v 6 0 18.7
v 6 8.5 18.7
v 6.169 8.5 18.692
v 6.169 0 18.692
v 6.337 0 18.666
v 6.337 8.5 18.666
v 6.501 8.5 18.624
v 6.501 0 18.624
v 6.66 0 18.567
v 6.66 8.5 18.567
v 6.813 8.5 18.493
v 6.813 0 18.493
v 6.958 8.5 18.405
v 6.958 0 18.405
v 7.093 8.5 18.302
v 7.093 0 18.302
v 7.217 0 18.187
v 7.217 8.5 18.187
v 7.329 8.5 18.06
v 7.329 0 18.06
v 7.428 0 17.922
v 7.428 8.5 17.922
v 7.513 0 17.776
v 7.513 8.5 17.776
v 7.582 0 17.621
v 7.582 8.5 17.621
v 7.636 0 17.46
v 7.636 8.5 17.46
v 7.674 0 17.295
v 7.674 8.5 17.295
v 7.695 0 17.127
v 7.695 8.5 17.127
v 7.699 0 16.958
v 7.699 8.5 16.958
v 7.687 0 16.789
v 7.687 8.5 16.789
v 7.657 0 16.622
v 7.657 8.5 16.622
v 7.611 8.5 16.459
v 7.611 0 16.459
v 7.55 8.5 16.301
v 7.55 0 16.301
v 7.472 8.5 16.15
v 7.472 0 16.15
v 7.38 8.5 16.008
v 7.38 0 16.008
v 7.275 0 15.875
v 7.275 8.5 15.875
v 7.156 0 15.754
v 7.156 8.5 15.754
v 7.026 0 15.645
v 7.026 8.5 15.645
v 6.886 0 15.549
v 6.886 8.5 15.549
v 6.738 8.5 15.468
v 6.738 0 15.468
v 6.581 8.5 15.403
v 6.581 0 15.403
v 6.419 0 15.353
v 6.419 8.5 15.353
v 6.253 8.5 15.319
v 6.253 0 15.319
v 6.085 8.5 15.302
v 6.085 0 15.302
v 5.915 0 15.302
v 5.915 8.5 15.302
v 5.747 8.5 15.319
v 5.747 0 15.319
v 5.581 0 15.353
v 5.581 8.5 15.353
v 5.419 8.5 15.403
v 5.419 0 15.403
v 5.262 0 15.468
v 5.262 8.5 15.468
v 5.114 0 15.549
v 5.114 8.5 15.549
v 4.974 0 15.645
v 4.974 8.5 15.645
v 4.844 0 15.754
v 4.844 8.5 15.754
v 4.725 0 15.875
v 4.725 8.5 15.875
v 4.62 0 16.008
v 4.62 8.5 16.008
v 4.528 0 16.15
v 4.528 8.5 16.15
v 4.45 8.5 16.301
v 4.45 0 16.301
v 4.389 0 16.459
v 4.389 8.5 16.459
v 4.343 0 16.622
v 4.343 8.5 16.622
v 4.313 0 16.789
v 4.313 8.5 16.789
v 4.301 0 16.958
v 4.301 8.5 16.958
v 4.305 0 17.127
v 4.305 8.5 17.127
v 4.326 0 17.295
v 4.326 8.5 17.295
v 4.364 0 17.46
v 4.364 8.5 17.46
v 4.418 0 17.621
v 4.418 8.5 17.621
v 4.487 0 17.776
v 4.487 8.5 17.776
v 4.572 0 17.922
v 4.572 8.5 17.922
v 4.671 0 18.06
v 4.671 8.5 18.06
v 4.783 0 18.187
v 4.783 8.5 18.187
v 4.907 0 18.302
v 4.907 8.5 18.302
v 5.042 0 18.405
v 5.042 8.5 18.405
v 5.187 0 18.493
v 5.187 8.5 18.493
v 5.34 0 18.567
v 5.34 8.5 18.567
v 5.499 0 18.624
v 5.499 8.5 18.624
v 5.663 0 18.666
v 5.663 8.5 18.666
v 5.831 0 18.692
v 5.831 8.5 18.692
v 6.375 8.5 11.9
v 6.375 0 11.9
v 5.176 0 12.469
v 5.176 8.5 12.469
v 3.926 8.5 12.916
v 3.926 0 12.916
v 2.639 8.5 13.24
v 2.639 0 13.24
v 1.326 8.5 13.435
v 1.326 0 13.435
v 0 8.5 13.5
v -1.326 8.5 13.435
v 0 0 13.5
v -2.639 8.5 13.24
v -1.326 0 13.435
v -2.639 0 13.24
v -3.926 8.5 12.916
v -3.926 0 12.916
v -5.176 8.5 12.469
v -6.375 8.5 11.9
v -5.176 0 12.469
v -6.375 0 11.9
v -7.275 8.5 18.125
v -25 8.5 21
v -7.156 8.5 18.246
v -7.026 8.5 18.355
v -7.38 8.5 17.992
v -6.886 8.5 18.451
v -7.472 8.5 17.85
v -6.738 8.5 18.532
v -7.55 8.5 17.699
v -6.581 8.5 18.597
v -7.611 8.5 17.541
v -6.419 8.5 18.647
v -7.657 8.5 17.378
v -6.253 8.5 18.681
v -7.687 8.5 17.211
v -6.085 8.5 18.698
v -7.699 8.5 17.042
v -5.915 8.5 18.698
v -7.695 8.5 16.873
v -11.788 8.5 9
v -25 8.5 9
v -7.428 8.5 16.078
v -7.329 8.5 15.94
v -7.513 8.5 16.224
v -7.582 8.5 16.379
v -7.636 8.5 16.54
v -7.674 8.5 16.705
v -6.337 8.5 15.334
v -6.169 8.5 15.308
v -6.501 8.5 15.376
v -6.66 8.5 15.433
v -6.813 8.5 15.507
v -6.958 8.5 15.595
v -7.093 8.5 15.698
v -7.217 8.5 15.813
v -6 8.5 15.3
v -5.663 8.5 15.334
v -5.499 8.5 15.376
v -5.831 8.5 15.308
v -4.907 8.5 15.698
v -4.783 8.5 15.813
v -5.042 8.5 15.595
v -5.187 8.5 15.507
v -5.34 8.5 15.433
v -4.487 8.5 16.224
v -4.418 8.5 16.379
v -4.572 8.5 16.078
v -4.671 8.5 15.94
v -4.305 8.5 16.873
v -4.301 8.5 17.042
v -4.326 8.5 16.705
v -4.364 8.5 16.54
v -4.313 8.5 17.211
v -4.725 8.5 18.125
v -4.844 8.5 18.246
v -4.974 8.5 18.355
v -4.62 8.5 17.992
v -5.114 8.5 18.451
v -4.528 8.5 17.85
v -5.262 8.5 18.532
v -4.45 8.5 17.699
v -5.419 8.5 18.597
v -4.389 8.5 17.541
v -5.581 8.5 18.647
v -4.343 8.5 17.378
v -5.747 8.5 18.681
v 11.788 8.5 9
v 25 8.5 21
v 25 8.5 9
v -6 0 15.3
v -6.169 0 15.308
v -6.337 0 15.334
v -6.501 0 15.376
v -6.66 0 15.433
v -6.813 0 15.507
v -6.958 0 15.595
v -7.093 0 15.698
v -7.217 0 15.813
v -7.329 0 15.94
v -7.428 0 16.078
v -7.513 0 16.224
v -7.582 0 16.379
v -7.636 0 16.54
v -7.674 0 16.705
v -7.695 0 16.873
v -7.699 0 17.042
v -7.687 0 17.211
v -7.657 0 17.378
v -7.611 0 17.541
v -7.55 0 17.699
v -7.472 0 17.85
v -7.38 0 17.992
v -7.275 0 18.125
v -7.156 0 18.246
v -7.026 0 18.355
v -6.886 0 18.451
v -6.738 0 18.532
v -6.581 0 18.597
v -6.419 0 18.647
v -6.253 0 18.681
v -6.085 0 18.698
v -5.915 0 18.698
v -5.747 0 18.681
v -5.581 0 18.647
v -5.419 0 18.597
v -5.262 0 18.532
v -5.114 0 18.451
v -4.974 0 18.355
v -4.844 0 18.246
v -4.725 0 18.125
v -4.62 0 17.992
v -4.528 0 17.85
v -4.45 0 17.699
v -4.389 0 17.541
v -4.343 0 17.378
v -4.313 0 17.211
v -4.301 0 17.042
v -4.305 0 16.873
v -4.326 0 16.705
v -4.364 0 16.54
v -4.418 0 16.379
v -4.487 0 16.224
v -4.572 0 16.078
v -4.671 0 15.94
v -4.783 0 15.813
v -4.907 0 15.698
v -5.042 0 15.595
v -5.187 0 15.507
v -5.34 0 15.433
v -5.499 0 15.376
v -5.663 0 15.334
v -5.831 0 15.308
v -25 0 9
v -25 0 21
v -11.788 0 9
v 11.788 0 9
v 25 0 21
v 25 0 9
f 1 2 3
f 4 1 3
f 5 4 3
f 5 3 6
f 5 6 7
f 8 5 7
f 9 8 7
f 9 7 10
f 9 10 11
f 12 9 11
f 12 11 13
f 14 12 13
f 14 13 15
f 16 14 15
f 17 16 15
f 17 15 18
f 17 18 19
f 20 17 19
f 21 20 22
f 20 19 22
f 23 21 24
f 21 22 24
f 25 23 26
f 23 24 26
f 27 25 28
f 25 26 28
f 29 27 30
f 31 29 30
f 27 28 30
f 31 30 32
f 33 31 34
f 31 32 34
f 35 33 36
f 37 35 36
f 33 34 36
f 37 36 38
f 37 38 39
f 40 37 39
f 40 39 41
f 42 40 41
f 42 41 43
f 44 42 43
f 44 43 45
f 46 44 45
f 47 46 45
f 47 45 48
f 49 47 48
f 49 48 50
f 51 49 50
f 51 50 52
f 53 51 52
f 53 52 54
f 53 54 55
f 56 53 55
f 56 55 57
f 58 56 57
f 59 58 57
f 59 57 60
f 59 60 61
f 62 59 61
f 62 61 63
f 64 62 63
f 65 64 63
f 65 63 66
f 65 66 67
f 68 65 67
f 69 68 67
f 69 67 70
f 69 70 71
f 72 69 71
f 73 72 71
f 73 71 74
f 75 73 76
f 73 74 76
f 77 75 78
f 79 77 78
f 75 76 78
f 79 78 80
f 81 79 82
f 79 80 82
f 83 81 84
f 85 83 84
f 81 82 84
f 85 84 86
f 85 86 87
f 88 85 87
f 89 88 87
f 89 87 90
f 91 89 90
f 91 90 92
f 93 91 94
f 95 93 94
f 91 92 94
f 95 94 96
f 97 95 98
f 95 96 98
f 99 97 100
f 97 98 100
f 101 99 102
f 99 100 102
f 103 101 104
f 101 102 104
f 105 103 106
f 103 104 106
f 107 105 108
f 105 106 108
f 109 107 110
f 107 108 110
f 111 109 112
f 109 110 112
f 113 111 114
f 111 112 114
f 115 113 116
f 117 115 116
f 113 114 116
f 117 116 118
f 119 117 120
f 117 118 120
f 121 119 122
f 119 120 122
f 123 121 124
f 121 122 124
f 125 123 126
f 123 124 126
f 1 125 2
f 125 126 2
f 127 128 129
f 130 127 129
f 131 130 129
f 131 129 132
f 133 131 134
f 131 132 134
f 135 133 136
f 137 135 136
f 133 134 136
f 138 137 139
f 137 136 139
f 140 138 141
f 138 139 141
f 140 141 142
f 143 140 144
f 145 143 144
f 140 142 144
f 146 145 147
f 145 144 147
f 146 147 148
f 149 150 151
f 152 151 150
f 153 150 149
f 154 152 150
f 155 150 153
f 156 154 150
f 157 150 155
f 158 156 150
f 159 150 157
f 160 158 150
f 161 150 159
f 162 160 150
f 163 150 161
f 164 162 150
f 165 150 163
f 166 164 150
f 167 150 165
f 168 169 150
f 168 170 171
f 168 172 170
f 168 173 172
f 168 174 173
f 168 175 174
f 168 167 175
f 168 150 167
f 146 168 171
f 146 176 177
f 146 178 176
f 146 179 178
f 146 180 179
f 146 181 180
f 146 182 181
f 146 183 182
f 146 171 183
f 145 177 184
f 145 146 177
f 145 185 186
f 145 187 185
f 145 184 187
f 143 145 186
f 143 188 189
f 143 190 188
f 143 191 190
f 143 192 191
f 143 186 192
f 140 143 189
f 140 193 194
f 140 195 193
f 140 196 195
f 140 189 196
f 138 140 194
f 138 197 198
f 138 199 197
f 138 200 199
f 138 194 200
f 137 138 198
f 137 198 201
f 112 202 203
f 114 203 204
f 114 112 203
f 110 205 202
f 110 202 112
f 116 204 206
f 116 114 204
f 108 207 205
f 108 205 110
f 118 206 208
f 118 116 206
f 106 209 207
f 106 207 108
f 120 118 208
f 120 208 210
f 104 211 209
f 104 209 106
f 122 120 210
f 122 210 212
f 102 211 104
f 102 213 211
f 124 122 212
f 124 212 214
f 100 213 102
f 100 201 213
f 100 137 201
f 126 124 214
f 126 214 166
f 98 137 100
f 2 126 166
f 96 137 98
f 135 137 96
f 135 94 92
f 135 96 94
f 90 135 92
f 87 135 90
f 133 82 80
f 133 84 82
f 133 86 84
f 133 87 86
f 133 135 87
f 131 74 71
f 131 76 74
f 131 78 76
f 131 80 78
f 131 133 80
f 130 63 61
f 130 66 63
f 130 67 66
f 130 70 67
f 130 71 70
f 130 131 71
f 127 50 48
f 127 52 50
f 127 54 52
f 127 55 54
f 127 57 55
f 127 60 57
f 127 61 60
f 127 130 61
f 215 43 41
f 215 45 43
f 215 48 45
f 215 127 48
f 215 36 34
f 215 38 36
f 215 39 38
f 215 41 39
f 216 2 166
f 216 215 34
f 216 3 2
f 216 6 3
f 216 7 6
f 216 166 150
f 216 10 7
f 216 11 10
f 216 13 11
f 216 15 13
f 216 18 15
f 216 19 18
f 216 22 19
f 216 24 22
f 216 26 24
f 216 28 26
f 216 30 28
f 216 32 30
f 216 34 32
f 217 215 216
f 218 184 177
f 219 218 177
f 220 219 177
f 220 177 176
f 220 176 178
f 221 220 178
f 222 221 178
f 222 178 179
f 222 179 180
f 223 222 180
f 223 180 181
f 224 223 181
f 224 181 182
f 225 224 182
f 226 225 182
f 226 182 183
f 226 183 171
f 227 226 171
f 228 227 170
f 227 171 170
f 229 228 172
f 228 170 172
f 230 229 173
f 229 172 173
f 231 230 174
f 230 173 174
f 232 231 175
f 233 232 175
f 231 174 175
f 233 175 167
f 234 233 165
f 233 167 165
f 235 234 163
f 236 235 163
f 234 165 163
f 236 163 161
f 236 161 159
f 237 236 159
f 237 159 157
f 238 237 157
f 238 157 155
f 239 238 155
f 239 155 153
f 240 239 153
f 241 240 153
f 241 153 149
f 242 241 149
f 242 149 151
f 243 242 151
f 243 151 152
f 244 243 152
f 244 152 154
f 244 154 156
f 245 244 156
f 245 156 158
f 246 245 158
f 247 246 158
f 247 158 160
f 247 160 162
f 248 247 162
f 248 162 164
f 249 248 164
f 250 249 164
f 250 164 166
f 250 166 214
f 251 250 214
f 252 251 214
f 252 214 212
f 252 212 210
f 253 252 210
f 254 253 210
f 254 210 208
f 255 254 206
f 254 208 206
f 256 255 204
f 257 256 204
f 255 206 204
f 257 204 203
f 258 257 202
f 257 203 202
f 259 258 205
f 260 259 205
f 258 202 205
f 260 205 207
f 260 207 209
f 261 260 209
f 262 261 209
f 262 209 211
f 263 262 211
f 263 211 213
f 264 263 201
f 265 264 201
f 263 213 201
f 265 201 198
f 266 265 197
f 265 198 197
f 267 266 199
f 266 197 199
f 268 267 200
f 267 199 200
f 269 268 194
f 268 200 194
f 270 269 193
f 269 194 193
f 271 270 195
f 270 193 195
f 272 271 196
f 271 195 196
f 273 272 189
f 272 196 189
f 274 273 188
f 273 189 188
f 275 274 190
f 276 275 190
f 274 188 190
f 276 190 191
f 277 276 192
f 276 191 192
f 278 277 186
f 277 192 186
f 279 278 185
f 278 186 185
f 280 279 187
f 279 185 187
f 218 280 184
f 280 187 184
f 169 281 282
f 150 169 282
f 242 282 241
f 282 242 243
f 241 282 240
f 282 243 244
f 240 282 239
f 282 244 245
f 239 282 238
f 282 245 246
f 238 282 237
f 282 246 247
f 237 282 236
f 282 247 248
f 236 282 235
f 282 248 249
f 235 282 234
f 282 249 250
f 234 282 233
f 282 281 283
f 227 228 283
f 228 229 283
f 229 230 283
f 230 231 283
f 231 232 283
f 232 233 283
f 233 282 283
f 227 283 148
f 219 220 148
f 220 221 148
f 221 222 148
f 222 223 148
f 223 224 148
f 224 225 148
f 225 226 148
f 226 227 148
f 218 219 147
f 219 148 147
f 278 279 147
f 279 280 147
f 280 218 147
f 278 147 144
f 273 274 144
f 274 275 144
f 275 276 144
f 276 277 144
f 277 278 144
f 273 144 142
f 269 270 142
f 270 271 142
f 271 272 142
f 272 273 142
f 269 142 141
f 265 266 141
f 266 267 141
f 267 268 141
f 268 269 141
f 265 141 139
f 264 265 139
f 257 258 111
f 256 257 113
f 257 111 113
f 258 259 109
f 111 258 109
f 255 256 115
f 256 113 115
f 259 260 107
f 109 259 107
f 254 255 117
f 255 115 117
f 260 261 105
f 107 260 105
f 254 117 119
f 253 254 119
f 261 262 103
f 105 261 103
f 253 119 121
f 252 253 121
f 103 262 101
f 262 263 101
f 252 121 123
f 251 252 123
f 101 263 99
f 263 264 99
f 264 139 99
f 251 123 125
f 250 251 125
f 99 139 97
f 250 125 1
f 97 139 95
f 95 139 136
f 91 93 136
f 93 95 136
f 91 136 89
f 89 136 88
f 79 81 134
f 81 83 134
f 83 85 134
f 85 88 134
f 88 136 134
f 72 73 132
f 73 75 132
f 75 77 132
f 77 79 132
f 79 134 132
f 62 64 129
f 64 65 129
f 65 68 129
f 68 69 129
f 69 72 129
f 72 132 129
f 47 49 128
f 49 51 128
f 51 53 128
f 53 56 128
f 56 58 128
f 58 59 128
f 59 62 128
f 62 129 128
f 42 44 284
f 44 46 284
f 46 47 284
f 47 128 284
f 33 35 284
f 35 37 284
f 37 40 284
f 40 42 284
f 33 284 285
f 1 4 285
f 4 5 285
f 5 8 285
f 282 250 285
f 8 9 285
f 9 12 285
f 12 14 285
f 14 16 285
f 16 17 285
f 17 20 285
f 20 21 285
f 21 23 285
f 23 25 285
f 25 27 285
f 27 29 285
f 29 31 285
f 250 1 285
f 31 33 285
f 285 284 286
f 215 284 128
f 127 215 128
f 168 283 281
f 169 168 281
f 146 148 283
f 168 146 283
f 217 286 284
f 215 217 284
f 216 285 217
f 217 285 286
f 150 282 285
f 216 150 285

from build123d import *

# Parameters (mm, degrees)
EXTRUDE_1_DEPTH     = 8.5
SKETCH_2_R          = 1.7
CUT_EXTRUDE_1_DEPTH = 34.737960816


with BuildPart() as part:
    # 草图1 → 凸台-拉伸1 (new body)
    with BuildSketch(Plane(origin=(0, 0, 0), x_dir=(1, 0, 0), z_dir=(0, 1, 0))):
        with BuildLine():
            Line((-25, -21), (25, -21))
            Line((25, -21), (25, -9))
            Line((25, -9), (11.788272368, -9))
            Line((11.788272368, -9), (6.375, -11.899973739))
            ThreePointArc((6.375, -11.899973739), (0, -13.5), (-6.375, -11.899973739))
            Line((-6.375, -11.899973739), (-11.788272368, -9))
            Line((-11.788272368, -9), (-25, -9))
            Line((-25, -9), (-25, -21))
        make_face()
    extrude(amount=EXTRUDE_1_DEPTH)

    # 草图2 → 切除-拉伸1 (cut, through all)
    with BuildSketch(Plane(origin=(0, 8.5, 0), x_dir=(1, 0, 0), z_dir=(0, 1, 0))):
        with Locations(Location((6, -17, 0), (0, 0, 270))):
            Circle(SKETCH_2_R)
        with Locations(Location((-6, -17, 0), (0, 0, 90))):
            Circle(SKETCH_2_R)
    extrude(amount=-CUT_EXTRUDE_1_DEPTH, mode=Mode.SUBTRACT)


solid = part.part
